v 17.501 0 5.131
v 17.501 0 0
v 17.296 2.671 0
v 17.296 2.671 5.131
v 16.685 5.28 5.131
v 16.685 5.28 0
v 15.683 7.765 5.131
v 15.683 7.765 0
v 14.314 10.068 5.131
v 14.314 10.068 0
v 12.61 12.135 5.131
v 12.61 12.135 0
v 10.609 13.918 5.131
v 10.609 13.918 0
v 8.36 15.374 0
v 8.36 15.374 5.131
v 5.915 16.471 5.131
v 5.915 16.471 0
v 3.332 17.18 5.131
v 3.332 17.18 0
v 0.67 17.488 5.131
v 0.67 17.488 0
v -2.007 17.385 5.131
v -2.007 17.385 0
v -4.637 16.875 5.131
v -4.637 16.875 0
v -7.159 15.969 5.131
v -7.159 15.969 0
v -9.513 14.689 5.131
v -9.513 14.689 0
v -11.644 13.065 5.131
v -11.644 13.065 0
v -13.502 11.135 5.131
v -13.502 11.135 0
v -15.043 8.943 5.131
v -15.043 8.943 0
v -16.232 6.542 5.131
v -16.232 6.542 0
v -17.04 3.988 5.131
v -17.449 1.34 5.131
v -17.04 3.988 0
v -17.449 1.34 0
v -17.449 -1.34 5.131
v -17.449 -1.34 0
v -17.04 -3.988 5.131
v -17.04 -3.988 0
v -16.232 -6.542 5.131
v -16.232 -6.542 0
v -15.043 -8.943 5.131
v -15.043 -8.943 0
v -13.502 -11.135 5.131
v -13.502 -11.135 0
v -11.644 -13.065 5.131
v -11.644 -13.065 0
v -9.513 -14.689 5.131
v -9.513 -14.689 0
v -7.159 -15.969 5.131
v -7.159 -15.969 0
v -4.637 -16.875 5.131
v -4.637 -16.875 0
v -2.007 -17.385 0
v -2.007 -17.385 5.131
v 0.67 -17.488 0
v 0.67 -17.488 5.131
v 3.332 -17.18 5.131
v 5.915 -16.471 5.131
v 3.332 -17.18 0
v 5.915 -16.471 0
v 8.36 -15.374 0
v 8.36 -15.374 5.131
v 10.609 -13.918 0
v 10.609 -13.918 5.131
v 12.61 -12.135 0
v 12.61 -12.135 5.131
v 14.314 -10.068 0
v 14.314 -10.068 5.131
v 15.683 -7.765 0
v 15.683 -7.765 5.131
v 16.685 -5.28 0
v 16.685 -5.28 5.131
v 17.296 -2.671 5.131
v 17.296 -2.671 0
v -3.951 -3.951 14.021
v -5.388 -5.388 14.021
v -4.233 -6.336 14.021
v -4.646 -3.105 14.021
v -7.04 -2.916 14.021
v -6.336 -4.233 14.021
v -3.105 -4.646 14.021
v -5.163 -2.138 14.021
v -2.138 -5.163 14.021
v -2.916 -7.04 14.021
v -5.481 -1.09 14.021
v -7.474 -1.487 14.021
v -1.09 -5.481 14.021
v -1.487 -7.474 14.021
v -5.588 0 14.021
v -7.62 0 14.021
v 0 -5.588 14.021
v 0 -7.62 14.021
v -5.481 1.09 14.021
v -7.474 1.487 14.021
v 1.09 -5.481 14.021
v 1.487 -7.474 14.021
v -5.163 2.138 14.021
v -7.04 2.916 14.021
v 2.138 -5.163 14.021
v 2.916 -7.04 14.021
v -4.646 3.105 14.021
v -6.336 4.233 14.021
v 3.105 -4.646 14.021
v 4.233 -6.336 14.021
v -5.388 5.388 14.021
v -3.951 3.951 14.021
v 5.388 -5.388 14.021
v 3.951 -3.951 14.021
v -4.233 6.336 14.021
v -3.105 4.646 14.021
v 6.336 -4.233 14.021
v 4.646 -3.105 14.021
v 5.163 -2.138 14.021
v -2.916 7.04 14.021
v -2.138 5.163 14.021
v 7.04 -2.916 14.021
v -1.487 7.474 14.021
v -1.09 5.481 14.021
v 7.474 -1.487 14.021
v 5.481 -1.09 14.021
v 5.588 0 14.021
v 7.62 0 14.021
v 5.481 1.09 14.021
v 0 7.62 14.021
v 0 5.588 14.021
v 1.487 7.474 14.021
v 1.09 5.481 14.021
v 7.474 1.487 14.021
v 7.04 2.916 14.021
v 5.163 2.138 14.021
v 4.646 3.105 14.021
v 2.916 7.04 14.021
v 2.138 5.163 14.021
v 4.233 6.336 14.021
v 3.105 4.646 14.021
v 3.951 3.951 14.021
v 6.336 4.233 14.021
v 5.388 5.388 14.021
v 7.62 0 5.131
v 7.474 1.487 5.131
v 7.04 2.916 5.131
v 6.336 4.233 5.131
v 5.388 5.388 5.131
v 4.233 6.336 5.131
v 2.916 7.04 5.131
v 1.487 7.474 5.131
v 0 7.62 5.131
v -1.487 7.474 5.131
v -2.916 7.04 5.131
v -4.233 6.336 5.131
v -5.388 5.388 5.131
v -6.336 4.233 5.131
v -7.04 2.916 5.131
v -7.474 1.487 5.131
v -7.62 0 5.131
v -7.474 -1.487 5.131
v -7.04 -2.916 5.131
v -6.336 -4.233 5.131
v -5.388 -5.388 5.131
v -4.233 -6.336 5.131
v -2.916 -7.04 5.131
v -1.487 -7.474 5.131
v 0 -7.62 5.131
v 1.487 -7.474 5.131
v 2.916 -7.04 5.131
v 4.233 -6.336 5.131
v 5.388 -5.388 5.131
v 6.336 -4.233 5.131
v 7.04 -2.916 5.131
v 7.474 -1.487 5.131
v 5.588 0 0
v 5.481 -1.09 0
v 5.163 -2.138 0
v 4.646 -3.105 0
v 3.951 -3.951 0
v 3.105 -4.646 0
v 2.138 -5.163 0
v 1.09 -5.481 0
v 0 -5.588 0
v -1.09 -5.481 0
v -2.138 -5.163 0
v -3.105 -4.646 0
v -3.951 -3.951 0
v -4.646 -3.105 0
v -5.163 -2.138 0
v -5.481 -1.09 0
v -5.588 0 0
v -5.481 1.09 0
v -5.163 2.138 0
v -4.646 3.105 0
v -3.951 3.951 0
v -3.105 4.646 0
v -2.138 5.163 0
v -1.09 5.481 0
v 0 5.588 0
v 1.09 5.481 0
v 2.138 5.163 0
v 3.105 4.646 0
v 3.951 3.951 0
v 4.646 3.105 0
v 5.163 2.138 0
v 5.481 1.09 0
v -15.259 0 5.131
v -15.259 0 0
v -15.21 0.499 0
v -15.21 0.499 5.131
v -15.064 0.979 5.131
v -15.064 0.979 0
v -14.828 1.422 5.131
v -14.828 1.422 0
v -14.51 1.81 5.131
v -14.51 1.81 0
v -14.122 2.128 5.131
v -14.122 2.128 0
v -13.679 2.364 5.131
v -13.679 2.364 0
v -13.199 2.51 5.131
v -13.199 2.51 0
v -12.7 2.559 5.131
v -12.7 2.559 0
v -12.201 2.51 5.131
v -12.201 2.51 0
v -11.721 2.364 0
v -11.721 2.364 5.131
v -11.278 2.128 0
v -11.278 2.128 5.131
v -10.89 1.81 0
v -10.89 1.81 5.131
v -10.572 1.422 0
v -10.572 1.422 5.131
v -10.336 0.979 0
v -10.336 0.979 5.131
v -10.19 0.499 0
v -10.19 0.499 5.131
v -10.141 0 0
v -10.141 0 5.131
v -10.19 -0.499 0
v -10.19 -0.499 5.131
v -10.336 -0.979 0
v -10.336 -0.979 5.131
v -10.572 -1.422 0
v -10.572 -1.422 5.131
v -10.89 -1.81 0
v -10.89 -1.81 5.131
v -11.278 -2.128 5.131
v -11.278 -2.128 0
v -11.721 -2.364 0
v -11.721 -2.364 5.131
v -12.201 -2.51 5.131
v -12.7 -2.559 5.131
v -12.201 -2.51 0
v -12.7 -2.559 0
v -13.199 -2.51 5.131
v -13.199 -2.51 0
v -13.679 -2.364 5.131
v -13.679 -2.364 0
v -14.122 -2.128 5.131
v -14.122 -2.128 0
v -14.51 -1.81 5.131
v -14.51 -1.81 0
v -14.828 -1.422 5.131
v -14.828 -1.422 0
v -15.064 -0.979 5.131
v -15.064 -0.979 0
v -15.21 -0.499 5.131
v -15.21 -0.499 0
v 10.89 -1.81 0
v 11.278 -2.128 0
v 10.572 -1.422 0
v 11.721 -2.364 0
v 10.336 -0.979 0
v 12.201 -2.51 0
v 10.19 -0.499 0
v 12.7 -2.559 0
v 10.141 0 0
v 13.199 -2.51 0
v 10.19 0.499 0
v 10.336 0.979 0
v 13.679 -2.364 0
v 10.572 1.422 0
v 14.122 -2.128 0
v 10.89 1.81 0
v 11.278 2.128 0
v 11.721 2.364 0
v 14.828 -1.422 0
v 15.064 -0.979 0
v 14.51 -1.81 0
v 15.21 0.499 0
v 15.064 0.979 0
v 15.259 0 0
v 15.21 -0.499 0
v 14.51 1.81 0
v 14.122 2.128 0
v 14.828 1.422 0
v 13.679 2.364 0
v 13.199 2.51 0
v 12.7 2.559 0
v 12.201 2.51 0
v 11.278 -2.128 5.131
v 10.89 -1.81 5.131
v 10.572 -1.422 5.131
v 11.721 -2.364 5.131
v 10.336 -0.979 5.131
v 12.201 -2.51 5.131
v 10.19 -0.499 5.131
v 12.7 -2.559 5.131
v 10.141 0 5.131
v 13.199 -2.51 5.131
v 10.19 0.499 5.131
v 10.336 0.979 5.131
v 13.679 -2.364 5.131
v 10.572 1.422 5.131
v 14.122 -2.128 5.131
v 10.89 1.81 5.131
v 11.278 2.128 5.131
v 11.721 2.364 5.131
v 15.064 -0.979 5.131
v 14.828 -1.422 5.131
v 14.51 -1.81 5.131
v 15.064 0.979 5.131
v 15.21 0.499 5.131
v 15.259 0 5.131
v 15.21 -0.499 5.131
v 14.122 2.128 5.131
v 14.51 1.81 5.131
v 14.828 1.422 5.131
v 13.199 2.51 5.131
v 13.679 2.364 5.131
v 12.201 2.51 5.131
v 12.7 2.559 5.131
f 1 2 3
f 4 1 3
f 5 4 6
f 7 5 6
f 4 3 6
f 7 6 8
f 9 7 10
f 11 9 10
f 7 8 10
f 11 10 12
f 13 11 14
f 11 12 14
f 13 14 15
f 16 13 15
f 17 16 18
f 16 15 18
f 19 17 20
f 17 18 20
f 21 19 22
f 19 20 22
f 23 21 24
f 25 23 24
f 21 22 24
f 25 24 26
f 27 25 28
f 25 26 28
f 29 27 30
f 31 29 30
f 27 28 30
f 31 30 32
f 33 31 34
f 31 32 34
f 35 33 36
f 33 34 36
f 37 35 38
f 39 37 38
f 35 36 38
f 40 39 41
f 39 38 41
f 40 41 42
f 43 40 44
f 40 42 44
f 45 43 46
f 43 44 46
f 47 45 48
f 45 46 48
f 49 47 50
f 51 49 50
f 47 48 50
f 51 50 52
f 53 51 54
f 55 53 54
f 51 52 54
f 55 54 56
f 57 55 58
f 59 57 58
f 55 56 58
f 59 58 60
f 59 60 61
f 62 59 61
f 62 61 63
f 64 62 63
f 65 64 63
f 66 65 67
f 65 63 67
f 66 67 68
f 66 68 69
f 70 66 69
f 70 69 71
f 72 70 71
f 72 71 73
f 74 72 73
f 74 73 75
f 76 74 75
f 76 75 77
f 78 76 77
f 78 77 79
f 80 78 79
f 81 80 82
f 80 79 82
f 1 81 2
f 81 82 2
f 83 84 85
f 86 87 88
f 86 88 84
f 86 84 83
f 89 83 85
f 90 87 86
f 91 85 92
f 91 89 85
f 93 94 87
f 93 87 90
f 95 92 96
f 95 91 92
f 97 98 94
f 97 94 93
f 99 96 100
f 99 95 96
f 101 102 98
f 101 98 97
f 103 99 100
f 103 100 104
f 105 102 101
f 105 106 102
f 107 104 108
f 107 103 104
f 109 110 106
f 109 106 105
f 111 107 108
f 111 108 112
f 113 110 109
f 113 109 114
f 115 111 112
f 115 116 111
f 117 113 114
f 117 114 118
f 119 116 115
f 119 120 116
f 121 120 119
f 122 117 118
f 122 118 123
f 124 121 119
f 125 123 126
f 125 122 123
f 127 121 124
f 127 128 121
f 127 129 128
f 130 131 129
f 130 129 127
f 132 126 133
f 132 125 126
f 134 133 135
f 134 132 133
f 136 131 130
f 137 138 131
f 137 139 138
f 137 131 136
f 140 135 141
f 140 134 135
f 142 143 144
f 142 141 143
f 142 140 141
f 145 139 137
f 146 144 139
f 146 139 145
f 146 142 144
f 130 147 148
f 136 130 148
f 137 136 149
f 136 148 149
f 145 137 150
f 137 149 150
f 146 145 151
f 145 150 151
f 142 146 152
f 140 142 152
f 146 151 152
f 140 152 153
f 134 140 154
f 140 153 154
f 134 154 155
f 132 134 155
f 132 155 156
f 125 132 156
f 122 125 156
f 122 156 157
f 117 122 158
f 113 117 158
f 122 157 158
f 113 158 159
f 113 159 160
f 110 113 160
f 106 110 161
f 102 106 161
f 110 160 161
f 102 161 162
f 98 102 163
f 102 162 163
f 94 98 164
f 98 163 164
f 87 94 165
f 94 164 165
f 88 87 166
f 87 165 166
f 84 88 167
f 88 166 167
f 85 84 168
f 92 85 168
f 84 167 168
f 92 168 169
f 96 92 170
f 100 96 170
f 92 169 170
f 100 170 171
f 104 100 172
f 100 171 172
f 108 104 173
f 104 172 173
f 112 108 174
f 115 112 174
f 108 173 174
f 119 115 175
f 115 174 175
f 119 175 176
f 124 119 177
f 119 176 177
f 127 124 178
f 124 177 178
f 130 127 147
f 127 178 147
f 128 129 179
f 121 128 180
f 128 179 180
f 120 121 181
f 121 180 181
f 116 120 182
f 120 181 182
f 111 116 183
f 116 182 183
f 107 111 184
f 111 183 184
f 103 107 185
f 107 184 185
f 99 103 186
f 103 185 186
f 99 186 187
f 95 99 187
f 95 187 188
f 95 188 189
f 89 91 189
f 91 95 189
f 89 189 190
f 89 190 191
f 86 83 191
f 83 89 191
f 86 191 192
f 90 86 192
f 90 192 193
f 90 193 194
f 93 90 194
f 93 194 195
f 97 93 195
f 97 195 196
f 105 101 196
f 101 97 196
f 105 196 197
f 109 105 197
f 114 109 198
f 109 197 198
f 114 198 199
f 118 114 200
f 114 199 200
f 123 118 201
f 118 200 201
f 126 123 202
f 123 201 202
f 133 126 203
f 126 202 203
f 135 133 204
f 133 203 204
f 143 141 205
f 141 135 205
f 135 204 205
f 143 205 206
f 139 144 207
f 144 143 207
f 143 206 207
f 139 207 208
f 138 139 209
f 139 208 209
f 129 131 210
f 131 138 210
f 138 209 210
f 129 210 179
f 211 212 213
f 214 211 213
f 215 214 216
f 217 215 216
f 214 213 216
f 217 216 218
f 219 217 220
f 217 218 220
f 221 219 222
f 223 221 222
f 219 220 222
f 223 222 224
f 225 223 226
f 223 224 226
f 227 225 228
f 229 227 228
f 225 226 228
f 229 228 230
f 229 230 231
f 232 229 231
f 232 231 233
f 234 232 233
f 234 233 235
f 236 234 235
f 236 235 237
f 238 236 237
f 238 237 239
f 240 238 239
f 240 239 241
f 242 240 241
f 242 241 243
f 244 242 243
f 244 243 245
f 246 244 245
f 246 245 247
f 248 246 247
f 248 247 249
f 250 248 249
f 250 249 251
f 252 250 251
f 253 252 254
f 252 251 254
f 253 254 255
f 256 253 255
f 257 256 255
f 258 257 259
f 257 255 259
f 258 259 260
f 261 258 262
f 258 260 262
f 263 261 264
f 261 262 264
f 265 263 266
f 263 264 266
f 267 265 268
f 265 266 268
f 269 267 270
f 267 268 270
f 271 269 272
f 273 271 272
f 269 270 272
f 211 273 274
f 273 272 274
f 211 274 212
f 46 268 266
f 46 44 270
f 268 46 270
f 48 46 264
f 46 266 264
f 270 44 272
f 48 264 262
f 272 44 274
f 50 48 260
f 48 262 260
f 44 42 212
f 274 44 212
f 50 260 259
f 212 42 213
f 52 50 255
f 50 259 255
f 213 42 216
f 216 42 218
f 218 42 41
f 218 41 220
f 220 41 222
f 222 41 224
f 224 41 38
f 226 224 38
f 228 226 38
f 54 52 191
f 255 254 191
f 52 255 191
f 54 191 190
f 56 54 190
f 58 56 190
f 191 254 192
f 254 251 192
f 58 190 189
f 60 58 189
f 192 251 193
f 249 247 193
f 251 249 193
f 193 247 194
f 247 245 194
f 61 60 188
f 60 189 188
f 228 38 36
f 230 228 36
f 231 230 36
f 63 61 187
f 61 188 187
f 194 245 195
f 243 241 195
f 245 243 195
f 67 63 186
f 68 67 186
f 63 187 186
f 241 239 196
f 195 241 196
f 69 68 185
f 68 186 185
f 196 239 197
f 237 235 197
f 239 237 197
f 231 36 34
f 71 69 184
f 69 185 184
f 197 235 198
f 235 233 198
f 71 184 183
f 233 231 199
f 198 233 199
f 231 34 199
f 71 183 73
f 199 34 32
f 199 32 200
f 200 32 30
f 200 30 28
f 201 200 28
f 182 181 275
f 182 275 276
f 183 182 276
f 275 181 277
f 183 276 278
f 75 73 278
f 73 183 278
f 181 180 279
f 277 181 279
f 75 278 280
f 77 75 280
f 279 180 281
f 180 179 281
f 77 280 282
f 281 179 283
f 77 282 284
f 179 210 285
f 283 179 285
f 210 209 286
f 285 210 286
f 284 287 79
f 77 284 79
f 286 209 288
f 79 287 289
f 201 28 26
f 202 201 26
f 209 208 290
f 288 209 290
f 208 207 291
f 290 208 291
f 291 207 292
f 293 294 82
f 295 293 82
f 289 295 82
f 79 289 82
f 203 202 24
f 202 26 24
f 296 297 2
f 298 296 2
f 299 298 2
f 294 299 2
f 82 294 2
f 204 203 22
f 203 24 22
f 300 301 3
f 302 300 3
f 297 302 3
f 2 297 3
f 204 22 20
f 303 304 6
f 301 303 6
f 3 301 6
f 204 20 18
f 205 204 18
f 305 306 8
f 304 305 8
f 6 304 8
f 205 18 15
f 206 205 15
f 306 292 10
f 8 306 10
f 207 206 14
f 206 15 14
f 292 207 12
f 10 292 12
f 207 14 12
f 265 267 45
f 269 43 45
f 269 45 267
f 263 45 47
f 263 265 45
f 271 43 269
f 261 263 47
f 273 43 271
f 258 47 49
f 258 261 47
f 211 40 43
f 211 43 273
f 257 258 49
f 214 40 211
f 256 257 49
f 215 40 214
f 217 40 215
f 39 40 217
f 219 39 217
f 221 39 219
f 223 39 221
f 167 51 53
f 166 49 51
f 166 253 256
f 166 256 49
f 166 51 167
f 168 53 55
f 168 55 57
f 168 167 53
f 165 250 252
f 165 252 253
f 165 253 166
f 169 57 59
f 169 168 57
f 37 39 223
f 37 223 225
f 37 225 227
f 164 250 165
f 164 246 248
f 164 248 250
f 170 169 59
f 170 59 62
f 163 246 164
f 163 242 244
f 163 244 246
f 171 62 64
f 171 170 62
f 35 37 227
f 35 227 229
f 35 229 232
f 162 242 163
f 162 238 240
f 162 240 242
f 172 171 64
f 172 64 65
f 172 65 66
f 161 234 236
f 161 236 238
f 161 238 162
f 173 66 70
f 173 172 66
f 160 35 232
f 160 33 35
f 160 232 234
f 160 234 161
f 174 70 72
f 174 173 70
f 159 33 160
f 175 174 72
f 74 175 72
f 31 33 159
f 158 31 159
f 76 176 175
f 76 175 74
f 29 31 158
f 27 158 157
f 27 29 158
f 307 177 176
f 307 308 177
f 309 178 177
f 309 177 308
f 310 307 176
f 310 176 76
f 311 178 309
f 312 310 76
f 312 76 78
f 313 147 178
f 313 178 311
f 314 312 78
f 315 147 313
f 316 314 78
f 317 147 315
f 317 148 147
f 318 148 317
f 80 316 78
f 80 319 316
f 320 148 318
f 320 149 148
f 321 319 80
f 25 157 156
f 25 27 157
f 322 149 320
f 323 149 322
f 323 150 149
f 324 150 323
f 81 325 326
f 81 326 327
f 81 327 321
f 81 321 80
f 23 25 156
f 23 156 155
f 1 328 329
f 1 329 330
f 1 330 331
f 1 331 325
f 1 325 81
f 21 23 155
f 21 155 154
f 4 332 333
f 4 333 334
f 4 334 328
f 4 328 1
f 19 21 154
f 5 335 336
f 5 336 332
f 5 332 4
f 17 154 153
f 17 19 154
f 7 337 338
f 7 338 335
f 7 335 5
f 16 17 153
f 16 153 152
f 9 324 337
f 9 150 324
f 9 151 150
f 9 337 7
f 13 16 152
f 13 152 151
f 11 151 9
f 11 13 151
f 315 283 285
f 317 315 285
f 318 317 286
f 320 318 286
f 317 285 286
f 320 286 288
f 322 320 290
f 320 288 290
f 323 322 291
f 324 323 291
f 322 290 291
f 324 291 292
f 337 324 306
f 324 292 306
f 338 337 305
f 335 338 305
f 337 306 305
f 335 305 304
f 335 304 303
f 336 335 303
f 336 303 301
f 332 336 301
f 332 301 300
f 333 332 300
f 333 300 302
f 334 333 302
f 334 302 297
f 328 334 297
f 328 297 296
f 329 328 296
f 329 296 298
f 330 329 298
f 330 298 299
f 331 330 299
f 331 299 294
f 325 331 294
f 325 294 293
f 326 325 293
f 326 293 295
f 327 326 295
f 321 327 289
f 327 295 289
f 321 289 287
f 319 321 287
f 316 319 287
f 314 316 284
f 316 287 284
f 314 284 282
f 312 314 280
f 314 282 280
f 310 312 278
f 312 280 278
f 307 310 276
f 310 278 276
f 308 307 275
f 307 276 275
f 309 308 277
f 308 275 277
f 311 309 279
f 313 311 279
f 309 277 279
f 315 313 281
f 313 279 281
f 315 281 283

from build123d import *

# Parameters (mm, degrees)
F0_R     = 17.5006
F1_DEPTH = 5.1308
F2_R     = 7.62
F2_R_2   = 5.588
F3_DEPTH = 8.89
F4_R     = 5.588
F5_DEPTH = 14.0218
F7_D     = 5.1181


with BuildPart() as f1:
    # F0 (on Top) → F1 (new body)
    with BuildSketch(Plane.XY):
        Circle(F0_R)
    extrude(amount=F1_DEPTH)

    # F2 (on face) → F3 (join)
    with BuildSketch(Plane.XY.offset(5.1308)):
        Circle(F2_R)
        Circle(F2_R_2, mode=Mode.SUBTRACT)
    extrude(amount=F3_DEPTH)

    # F4 (on face) → F5 (cut, through all)
    with BuildSketch(Plane(origin=(0, 0, 0), x_dir=(1, 0, 0), z_dir=(0, 0, -1))):
        Circle(F4_R)
    extrude(amount=-F5_DEPTH, mode=Mode.SUBTRACT)

    # F7 (through all)
    with Locations(Plane.XY.offset(5.1308)):
        with Locations((-12.7, 0), (12.7, 0)):
            Hole(F7_D / 2)


solid = f1.part
